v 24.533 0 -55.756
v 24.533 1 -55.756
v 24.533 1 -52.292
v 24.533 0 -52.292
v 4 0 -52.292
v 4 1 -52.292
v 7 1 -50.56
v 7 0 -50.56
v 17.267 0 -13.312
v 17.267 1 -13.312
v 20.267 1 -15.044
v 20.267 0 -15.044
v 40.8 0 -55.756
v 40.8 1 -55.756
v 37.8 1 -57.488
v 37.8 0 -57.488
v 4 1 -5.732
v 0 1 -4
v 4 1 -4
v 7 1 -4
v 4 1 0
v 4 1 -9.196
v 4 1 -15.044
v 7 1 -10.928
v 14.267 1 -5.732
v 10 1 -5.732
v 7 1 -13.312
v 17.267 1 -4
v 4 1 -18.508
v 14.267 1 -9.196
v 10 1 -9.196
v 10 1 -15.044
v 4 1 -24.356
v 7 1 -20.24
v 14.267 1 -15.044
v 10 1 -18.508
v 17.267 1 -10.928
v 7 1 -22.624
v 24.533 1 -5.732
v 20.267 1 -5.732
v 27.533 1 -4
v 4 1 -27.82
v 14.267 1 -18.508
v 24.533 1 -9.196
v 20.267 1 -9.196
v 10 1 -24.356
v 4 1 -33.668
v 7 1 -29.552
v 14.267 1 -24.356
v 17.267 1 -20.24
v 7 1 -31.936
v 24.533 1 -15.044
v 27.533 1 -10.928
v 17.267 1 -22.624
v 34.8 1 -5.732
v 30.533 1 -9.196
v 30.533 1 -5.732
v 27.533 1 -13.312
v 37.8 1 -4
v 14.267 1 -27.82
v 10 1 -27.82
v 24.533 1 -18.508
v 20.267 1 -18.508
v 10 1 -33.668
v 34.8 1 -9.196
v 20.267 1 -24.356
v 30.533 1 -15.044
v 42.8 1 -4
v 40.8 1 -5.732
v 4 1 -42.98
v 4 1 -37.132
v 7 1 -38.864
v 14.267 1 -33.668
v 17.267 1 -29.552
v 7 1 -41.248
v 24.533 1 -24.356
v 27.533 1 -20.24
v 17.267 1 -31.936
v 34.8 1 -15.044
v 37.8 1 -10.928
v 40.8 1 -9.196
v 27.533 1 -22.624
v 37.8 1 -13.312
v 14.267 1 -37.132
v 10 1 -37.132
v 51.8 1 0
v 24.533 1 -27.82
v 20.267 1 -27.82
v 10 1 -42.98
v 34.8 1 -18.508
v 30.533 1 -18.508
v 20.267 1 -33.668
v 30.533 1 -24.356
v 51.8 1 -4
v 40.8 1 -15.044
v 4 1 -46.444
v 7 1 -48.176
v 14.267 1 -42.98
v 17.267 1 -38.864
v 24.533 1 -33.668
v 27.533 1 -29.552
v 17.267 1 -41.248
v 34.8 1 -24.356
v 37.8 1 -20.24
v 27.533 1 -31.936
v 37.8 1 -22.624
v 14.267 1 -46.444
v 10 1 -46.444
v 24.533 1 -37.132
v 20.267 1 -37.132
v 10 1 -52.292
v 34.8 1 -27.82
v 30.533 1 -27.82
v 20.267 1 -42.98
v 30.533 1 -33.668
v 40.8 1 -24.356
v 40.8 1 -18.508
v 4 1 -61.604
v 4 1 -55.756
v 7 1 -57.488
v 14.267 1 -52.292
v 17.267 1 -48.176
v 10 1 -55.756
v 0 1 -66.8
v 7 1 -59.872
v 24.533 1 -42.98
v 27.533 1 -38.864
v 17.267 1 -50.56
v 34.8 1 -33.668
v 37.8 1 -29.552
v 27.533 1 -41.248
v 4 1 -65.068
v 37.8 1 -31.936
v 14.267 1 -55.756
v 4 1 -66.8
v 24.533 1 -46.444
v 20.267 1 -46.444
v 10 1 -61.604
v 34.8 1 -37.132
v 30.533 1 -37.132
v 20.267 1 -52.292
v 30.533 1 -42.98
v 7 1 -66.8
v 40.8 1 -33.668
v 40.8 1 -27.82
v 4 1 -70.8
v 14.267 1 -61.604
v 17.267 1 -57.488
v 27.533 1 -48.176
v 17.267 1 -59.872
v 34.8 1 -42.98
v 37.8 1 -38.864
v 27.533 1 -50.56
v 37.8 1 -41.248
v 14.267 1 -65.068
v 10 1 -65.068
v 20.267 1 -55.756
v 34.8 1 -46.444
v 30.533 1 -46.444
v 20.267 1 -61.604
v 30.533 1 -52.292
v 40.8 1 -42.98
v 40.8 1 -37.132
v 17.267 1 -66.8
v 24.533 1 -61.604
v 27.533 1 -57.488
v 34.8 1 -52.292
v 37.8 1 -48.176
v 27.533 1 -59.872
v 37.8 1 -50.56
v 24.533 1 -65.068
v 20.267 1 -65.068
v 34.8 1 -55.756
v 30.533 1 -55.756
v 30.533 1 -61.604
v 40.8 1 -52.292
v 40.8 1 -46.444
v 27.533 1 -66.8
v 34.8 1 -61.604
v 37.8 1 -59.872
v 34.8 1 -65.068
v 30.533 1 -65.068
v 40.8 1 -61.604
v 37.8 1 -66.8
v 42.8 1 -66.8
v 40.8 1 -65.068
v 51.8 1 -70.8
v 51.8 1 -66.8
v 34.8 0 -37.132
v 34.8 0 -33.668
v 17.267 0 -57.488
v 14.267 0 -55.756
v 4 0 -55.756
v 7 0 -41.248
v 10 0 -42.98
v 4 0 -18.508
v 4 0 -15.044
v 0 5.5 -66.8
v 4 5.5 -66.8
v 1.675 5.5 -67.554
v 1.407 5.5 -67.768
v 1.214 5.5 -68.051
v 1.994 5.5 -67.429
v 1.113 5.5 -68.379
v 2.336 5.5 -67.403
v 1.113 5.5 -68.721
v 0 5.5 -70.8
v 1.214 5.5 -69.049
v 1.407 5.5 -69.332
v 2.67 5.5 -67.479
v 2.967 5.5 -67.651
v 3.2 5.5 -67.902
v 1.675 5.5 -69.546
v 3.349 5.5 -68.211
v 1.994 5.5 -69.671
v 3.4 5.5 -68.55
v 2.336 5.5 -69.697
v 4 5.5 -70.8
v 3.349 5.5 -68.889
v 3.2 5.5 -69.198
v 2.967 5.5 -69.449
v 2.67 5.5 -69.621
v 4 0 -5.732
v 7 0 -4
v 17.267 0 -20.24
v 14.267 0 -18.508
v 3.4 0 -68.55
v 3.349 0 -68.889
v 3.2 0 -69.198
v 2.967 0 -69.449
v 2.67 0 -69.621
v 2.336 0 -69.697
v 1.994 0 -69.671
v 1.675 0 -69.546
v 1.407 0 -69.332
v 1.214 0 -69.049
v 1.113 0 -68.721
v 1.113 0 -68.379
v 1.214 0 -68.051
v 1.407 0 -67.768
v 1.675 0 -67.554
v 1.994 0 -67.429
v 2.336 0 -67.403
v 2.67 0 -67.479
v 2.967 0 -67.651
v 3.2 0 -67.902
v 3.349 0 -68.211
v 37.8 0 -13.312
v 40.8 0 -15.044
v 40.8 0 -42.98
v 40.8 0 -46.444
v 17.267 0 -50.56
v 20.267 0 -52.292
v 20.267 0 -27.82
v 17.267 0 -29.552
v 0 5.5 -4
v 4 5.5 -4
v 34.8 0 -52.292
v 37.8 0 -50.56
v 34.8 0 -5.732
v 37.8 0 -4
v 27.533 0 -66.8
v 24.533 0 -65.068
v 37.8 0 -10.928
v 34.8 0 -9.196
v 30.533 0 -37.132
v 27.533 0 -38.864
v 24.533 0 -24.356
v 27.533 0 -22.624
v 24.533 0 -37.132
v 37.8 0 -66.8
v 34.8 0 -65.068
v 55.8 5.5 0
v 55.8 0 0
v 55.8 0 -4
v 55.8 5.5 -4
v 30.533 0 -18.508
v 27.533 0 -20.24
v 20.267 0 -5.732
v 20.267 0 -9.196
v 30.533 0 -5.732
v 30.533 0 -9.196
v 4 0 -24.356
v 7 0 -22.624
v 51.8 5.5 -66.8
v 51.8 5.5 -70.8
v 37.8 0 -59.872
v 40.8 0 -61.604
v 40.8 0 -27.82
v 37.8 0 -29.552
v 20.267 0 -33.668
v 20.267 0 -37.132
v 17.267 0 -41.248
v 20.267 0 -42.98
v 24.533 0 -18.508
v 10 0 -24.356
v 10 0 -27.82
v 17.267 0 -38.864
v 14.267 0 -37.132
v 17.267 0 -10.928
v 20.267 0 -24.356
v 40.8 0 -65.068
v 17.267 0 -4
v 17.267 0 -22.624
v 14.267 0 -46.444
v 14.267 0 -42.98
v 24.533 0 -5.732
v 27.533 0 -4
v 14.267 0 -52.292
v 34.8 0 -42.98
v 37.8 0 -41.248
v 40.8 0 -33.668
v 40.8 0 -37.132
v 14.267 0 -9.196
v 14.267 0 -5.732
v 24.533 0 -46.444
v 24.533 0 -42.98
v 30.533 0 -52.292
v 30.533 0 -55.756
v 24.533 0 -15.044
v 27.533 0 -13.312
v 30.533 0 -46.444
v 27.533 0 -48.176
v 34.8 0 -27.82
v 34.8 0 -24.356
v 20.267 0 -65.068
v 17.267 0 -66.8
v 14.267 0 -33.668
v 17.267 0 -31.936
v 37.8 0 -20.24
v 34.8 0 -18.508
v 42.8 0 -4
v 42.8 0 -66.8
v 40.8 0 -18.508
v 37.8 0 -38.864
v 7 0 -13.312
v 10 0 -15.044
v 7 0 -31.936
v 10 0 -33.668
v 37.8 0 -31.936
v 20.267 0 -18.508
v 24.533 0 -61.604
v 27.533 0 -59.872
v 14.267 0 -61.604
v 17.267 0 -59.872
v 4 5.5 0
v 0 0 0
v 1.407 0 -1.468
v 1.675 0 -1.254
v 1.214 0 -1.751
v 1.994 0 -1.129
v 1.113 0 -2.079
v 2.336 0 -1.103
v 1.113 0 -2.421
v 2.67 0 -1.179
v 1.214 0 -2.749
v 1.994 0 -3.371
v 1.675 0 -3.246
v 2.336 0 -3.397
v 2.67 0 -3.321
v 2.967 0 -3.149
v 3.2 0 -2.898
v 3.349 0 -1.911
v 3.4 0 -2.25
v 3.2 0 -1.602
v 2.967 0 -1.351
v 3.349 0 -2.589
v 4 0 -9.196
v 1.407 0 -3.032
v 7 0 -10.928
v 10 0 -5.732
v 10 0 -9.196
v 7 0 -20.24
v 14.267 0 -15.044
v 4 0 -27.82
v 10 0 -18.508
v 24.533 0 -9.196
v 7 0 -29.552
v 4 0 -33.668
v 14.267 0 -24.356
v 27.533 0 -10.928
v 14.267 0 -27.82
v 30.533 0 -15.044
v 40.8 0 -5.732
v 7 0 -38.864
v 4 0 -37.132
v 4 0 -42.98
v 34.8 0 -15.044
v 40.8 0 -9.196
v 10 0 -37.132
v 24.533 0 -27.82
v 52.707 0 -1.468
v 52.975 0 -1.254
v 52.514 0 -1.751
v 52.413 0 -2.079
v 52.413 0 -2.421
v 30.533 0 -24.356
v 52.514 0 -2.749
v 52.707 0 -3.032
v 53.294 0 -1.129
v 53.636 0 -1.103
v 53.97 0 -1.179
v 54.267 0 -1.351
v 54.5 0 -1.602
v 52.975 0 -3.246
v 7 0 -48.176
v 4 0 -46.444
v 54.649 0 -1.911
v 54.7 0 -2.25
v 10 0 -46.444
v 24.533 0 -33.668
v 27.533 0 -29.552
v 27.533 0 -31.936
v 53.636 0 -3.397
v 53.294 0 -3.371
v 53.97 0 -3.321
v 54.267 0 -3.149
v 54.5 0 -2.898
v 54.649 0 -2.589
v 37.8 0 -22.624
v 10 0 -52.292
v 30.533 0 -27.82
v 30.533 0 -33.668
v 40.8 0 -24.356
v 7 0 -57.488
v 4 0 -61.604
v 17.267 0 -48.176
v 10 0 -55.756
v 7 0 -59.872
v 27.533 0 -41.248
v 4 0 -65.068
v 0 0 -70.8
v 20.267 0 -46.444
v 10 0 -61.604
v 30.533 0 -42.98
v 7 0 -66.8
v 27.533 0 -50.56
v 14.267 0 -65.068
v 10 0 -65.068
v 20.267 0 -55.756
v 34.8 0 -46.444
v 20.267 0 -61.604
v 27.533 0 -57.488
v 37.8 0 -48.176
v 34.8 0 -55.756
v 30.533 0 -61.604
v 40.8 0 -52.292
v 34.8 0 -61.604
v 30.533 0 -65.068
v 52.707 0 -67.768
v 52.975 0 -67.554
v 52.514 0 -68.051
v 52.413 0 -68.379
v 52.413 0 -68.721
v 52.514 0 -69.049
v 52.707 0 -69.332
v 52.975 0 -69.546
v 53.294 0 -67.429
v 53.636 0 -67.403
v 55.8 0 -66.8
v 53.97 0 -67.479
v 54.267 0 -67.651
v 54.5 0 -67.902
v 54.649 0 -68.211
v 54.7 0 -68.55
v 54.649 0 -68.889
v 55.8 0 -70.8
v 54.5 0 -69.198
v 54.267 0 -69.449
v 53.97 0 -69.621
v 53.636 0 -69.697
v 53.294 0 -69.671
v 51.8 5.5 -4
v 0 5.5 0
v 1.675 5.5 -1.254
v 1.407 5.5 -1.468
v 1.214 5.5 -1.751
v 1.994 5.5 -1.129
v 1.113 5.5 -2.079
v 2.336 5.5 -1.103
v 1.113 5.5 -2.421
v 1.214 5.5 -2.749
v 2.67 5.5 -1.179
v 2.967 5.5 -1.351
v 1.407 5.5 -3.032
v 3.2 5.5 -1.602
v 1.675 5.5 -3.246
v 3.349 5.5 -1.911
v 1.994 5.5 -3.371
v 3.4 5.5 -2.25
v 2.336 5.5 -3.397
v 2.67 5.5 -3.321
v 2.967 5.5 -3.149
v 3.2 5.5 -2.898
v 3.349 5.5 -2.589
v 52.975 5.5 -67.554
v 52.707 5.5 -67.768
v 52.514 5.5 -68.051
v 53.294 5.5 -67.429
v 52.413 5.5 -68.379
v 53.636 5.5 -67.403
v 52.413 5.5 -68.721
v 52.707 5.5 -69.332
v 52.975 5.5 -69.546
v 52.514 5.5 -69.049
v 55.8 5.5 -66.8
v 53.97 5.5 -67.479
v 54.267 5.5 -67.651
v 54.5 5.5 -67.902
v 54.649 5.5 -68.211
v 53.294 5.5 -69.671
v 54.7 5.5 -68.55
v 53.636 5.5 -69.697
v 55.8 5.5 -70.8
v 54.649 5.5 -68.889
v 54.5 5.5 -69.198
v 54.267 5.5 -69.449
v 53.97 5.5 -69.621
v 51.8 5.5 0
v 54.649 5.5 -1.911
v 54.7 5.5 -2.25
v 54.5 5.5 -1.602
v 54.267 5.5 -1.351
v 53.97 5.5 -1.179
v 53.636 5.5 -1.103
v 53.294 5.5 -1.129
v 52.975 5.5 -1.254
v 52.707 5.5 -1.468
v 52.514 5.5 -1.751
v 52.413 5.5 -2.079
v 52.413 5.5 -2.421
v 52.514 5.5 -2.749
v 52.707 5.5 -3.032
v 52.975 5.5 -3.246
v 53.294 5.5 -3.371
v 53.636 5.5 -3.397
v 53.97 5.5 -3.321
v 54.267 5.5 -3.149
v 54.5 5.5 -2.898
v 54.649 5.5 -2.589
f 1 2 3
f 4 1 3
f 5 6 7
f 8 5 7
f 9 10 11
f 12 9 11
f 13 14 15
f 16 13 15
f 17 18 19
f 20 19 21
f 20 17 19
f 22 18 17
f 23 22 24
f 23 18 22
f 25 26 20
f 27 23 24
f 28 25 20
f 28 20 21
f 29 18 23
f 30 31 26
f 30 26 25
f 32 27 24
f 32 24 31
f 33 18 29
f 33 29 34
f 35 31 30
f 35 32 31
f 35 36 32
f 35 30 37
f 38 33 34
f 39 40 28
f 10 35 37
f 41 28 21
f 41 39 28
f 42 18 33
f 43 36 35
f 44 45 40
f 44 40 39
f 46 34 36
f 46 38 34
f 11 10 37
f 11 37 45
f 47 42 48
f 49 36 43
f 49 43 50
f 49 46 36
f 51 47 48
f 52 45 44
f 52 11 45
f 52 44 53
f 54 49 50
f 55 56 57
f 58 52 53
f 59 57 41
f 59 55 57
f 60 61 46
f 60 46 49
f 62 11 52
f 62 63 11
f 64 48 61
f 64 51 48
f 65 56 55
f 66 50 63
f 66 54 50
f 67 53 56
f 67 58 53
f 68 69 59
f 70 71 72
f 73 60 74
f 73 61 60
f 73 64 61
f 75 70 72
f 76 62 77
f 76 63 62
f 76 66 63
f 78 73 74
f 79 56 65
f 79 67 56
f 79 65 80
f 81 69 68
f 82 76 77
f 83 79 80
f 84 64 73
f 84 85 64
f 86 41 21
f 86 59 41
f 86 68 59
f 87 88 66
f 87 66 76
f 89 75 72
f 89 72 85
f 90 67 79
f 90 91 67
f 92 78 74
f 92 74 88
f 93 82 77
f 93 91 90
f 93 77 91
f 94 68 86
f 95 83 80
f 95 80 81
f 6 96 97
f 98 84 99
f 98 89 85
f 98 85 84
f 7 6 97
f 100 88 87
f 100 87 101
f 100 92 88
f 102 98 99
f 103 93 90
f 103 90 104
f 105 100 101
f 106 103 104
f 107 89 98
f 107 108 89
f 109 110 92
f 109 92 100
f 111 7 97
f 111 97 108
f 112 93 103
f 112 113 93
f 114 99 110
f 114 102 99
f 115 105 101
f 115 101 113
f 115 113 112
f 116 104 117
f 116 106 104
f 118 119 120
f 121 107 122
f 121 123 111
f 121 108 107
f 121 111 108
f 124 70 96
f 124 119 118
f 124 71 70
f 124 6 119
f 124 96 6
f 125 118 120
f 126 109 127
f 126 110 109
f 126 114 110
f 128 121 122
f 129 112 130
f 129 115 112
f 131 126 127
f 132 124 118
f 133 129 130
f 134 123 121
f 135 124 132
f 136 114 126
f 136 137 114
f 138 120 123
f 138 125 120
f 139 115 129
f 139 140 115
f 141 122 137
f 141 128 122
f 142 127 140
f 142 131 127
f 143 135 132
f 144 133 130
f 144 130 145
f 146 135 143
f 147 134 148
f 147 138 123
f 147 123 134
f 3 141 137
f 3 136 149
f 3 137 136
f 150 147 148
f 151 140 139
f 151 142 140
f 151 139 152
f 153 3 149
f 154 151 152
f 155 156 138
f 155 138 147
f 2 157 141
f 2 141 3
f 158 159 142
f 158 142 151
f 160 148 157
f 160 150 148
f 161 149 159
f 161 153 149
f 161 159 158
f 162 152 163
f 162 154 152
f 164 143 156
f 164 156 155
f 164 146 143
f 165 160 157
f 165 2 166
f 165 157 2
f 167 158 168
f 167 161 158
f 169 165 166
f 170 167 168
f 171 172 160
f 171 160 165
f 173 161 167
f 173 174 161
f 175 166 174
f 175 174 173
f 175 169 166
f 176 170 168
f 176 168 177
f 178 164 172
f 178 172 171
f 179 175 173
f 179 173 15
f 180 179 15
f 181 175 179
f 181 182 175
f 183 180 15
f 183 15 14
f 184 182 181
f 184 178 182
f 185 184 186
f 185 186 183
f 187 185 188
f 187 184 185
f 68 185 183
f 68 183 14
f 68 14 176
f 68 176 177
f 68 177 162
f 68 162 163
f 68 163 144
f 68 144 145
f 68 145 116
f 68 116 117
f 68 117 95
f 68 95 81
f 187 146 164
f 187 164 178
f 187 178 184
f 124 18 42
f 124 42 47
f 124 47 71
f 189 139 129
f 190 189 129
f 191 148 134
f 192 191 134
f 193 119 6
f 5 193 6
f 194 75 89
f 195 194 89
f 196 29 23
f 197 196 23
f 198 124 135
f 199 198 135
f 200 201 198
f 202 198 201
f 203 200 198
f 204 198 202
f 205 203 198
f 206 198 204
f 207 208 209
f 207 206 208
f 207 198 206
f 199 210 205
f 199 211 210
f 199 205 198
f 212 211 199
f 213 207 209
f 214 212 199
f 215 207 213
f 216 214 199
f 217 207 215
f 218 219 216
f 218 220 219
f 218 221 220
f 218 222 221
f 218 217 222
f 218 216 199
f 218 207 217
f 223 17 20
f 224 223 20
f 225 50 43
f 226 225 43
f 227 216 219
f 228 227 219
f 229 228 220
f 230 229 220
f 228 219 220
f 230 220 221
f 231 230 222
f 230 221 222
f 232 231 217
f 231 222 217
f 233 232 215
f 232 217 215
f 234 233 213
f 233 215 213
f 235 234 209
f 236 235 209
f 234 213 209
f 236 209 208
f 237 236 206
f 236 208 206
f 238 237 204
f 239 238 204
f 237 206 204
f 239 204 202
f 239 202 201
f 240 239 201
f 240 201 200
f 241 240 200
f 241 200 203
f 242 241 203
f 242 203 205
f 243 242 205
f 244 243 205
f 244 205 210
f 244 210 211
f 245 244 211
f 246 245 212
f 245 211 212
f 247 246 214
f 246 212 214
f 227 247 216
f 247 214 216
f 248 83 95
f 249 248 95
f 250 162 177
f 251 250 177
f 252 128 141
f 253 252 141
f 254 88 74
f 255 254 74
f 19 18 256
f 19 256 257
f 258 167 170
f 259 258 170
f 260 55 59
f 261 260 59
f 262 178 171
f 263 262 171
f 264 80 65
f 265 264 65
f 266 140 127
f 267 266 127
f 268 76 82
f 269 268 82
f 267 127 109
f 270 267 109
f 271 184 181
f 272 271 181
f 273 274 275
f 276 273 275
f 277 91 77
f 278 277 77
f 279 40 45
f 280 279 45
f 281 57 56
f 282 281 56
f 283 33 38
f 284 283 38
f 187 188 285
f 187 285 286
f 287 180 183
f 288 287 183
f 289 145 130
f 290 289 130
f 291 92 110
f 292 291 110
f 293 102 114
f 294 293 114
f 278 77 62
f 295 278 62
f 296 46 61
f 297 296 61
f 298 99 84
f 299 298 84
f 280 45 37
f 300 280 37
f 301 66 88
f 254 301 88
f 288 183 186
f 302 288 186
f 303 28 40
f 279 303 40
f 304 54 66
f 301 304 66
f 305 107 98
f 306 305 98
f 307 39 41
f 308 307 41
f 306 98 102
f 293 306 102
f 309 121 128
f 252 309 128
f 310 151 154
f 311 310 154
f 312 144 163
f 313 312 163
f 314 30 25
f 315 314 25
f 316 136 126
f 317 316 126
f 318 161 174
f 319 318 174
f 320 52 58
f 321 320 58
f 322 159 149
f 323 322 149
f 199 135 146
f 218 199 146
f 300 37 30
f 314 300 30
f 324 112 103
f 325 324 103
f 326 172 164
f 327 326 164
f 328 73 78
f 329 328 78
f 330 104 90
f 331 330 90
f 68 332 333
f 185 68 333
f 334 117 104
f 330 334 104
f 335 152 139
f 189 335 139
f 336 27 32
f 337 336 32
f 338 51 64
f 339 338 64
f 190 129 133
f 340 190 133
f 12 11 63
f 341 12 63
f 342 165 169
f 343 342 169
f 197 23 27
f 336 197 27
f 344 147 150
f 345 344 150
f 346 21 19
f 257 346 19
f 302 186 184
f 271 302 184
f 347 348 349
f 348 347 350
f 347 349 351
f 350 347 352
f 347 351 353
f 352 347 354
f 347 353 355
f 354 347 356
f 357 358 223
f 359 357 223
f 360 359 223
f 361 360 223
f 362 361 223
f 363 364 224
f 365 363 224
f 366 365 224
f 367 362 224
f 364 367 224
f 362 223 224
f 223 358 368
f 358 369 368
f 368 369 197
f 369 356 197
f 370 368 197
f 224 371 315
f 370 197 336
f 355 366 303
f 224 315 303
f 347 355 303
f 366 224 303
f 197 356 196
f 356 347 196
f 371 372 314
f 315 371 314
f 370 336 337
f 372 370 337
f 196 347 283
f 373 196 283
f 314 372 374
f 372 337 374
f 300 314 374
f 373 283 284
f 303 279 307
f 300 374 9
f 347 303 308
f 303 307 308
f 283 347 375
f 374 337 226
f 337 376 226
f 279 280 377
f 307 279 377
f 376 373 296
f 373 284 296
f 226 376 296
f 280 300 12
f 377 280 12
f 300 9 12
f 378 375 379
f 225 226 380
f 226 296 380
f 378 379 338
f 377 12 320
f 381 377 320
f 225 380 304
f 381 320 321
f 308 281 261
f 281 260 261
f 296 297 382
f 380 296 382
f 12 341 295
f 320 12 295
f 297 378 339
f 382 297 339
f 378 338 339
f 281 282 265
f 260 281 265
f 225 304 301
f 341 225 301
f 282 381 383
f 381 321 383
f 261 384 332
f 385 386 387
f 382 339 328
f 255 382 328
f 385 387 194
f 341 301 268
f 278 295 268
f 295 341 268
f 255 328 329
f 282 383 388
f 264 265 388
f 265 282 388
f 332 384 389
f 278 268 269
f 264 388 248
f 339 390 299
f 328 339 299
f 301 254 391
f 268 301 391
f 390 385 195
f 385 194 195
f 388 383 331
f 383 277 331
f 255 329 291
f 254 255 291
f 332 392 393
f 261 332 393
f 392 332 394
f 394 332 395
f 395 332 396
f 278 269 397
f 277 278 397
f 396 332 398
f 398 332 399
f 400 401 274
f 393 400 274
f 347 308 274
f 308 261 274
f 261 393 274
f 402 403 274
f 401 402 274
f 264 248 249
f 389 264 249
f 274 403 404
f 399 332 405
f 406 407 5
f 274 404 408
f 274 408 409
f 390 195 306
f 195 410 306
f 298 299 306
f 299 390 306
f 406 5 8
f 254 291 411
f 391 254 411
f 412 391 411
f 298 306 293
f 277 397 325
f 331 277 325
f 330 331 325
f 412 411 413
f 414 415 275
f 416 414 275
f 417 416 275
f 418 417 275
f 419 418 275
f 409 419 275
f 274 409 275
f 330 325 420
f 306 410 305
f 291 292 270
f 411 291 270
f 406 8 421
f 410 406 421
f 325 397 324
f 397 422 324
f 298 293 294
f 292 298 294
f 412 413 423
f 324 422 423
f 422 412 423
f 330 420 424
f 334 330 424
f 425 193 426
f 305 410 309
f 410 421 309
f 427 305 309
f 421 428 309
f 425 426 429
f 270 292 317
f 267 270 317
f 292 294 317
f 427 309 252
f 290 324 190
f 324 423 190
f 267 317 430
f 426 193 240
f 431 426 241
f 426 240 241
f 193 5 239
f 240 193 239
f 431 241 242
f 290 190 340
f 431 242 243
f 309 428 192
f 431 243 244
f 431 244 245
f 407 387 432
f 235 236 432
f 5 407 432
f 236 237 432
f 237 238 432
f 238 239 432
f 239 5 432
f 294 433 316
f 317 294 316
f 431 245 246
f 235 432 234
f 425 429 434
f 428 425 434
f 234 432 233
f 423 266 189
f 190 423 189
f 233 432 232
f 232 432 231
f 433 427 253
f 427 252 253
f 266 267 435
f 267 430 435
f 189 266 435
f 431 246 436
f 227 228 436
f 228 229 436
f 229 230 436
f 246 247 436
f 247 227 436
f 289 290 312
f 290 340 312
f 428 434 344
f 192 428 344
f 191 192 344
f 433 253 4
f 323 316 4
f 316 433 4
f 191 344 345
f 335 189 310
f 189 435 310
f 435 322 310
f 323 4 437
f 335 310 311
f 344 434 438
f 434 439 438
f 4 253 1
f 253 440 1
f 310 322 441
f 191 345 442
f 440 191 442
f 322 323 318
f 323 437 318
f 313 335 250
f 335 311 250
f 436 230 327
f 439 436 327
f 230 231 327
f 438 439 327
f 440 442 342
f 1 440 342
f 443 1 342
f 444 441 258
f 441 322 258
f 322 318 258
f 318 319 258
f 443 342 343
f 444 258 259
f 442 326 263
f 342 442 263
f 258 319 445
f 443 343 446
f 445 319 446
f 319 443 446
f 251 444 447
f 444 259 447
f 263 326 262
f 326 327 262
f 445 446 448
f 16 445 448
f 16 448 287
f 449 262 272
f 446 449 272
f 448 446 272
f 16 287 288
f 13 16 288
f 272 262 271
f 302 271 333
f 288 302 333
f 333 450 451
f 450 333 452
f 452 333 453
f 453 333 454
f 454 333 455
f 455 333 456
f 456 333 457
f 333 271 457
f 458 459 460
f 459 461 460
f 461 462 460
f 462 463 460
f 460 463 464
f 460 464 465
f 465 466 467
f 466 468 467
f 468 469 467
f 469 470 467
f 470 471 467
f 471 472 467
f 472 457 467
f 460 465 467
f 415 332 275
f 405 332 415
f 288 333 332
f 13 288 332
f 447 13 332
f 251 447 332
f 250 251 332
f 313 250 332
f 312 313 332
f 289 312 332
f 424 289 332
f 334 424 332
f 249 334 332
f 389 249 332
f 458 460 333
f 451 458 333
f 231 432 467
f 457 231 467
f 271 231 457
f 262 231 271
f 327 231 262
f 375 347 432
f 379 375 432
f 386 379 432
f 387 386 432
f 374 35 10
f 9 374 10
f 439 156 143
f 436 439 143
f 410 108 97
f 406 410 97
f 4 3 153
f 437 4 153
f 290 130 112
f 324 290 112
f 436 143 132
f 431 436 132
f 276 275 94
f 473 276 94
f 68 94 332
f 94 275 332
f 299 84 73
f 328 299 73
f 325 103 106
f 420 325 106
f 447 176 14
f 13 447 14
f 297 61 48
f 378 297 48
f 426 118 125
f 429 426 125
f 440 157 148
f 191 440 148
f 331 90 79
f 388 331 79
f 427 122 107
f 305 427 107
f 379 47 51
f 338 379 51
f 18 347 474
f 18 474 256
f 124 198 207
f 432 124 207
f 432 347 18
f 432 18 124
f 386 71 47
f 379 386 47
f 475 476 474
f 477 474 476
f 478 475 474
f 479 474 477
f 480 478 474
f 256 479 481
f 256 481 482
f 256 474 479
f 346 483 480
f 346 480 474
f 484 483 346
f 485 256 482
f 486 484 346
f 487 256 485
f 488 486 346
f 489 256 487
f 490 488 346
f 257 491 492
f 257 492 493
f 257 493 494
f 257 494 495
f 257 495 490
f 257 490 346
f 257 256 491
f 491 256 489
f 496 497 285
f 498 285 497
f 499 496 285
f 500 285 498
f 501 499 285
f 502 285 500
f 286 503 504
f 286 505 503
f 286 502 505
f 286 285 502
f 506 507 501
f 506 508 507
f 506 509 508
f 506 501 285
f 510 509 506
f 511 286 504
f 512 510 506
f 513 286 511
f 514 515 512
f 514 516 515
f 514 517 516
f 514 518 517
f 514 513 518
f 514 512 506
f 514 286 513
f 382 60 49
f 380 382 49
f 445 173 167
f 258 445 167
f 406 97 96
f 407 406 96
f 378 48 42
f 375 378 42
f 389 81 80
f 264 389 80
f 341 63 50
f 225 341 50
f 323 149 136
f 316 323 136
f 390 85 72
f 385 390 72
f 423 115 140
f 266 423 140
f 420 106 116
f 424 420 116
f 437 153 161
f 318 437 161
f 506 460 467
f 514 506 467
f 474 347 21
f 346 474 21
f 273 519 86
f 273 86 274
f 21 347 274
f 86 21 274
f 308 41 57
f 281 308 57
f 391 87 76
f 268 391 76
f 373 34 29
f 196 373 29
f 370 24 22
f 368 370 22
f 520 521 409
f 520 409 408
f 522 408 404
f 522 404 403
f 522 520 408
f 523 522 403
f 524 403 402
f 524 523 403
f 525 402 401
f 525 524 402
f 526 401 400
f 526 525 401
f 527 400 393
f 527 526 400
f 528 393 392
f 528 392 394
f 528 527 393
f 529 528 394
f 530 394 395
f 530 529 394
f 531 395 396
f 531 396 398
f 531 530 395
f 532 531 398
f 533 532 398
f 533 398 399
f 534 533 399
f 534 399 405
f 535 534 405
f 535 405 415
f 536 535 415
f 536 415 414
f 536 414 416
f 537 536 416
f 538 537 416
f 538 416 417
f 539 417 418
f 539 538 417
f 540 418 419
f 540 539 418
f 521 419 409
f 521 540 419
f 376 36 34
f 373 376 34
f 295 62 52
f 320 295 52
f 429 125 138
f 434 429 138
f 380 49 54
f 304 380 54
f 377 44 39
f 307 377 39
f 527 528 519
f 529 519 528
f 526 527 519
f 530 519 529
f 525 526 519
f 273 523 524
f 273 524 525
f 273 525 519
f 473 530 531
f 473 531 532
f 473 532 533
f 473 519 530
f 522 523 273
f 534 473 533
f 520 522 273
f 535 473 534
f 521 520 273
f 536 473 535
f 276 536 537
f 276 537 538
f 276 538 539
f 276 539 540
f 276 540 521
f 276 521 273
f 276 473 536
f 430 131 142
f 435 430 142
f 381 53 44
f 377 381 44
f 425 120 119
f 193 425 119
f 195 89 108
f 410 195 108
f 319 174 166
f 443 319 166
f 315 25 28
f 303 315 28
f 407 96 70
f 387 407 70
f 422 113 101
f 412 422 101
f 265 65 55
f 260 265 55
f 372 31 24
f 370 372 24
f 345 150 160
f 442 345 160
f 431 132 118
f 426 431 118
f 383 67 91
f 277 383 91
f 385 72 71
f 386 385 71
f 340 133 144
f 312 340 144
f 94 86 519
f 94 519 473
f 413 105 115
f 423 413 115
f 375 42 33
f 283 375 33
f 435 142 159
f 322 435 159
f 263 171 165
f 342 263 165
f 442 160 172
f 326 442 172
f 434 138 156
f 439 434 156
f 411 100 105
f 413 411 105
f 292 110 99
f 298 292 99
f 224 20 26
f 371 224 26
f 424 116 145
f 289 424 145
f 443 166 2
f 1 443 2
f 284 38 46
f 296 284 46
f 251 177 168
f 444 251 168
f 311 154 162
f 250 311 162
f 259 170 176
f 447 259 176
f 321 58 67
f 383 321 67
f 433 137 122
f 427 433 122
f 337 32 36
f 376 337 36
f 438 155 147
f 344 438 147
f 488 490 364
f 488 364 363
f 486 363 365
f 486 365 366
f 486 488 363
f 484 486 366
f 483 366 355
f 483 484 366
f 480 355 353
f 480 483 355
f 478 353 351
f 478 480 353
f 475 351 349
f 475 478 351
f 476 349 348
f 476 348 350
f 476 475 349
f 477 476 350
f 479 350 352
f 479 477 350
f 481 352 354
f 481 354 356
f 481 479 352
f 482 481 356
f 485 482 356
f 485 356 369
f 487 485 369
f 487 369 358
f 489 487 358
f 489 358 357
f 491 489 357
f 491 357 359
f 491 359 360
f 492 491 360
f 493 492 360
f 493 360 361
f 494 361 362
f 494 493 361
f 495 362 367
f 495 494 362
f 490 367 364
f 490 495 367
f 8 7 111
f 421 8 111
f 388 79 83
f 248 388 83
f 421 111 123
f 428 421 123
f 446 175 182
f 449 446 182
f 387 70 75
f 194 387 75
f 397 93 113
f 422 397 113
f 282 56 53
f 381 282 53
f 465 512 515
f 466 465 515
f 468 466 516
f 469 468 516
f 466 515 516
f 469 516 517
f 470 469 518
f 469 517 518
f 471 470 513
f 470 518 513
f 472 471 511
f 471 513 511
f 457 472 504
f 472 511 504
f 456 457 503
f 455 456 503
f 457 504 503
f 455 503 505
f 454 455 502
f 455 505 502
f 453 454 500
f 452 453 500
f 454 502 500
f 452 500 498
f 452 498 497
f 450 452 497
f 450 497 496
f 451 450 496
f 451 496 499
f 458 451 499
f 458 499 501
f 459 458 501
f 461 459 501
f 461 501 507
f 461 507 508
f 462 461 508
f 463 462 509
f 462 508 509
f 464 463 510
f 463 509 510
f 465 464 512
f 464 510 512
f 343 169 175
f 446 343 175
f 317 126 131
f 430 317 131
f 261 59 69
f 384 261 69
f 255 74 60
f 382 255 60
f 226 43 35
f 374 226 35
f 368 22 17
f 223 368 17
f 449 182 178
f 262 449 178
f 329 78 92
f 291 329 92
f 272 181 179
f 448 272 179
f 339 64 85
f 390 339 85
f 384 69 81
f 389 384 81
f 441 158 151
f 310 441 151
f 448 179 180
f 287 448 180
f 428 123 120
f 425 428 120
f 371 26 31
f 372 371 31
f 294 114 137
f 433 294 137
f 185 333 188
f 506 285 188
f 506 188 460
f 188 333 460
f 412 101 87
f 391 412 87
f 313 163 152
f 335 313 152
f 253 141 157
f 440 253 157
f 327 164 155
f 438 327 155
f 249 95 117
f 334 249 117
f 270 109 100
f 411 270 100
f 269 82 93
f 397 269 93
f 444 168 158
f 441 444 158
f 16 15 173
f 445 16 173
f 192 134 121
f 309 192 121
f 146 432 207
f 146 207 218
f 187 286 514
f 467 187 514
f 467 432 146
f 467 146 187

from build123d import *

# Parameters (mm, degrees)
BOSS_EXTRUDE1_DEPTH  = 1
CUT_EXTRUDE1_DEPTH   = 1
LPATTERN1_COUNT      = 4
LPATTERN1_PITCH      = 10.266666667
LPATTERN1_COUNT_DIR2 = 7
LPATTERN1_PITCH_DIR2 = 9.311966128
SKETCH3_W            = 4
SKETCH3_H            = 4
BOSS_EXTRUDE2_DEPTH  = 4.5
SKETCH4_R            = 1.15
CUT_EXTRUDE2_DEPTH   = 5.5


with BuildPart() as part:
    # Sketch1 → Boss-Extrude1 (new body)
    with BuildSketch(Plane(origin=(0, 0, 0), x_dir=(1, 0, 0), z_dir=(0, 1, 0))):
        Polygon((0, 0), (55.8, 0), (55.8, 4), (42.8, 4), (42.8, 66.8), (55.8, 66.8), (55.8, 70.8), (0, 70.8), align=None)
    extrude(amount=BOSS_EXTRUDE1_DEPTH)

    # Sketch2 → Cut-Extrude1 (cut)
    with BuildSketch(Plane(origin=(0, 1, 0), x_dir=(1, 0, 0), z_dir=(0, 1, 0))):
        Polygon((7, 66.8), (4, 65.067949192), (4, 61.603847577), (7, 59.87179677), (10, 61.603847577), (10, 65.067949192), align=None)
    cut_extrude1 = extrude(amount=-CUT_EXTRUDE1_DEPTH, mode=Mode.SUBTRACT)

    # LPattern1: Cut-Extrude1 4 × 7
    with Locations(*[(i * LPATTERN1_PITCH, 0, j * LPATTERN1_PITCH_DIR2) for i in range(LPATTERN1_COUNT) for j in range(LPATTERN1_COUNT_DIR2) if (i, j) != (0, 0)]):
        add(cut_extrude1, mode=Mode.SUBTRACT)

    # Sketch3 → Boss-Extrude2 (add)
    with BuildSketch(Plane(origin=(0, 1, 0), x_dir=(1, 0, 0), z_dir=(0, 1, 0))):
        with Locations((2, 68.8)):
            Rectangle(SKETCH3_W, SKETCH3_H)
        with Locations((53.8, 68.8)):
            Rectangle(SKETCH3_W, SKETCH3_H)
        with Locations((53.8, 2)):
            Rectangle(SKETCH3_W, SKETCH3_H)
        with Locations((2, 2)):
            Rectangle(SKETCH3_W, SKETCH3_H)
    extrude(amount=BOSS_EXTRUDE2_DEPTH)

    # Sketch4 → Cut-Extrude2 (cut)
    with BuildSketch(Plane(origin=(0, 5.5, 0), x_dir=(1, 0, 0), z_dir=(0, 1, 0))):
        with Locations((2.25, 68.55)):
            Circle(SKETCH4_R)
        with Locations((53.55, 68.55)):
            Circle(SKETCH4_R)
    cut_extrude2 = extrude(amount=-CUT_EXTRUDE2_DEPTH, mode=Mode.SUBTRACT)

    # Mirror1: Cut-Extrude2 across plane
    add(cut_extrude2.mirror(Plane(origin=(0, 0, -35.4), x_dir=(1, 0, 0), z_dir=(0, 0, -1))), mode=Mode.SUBTRACT)


solid = part.part
